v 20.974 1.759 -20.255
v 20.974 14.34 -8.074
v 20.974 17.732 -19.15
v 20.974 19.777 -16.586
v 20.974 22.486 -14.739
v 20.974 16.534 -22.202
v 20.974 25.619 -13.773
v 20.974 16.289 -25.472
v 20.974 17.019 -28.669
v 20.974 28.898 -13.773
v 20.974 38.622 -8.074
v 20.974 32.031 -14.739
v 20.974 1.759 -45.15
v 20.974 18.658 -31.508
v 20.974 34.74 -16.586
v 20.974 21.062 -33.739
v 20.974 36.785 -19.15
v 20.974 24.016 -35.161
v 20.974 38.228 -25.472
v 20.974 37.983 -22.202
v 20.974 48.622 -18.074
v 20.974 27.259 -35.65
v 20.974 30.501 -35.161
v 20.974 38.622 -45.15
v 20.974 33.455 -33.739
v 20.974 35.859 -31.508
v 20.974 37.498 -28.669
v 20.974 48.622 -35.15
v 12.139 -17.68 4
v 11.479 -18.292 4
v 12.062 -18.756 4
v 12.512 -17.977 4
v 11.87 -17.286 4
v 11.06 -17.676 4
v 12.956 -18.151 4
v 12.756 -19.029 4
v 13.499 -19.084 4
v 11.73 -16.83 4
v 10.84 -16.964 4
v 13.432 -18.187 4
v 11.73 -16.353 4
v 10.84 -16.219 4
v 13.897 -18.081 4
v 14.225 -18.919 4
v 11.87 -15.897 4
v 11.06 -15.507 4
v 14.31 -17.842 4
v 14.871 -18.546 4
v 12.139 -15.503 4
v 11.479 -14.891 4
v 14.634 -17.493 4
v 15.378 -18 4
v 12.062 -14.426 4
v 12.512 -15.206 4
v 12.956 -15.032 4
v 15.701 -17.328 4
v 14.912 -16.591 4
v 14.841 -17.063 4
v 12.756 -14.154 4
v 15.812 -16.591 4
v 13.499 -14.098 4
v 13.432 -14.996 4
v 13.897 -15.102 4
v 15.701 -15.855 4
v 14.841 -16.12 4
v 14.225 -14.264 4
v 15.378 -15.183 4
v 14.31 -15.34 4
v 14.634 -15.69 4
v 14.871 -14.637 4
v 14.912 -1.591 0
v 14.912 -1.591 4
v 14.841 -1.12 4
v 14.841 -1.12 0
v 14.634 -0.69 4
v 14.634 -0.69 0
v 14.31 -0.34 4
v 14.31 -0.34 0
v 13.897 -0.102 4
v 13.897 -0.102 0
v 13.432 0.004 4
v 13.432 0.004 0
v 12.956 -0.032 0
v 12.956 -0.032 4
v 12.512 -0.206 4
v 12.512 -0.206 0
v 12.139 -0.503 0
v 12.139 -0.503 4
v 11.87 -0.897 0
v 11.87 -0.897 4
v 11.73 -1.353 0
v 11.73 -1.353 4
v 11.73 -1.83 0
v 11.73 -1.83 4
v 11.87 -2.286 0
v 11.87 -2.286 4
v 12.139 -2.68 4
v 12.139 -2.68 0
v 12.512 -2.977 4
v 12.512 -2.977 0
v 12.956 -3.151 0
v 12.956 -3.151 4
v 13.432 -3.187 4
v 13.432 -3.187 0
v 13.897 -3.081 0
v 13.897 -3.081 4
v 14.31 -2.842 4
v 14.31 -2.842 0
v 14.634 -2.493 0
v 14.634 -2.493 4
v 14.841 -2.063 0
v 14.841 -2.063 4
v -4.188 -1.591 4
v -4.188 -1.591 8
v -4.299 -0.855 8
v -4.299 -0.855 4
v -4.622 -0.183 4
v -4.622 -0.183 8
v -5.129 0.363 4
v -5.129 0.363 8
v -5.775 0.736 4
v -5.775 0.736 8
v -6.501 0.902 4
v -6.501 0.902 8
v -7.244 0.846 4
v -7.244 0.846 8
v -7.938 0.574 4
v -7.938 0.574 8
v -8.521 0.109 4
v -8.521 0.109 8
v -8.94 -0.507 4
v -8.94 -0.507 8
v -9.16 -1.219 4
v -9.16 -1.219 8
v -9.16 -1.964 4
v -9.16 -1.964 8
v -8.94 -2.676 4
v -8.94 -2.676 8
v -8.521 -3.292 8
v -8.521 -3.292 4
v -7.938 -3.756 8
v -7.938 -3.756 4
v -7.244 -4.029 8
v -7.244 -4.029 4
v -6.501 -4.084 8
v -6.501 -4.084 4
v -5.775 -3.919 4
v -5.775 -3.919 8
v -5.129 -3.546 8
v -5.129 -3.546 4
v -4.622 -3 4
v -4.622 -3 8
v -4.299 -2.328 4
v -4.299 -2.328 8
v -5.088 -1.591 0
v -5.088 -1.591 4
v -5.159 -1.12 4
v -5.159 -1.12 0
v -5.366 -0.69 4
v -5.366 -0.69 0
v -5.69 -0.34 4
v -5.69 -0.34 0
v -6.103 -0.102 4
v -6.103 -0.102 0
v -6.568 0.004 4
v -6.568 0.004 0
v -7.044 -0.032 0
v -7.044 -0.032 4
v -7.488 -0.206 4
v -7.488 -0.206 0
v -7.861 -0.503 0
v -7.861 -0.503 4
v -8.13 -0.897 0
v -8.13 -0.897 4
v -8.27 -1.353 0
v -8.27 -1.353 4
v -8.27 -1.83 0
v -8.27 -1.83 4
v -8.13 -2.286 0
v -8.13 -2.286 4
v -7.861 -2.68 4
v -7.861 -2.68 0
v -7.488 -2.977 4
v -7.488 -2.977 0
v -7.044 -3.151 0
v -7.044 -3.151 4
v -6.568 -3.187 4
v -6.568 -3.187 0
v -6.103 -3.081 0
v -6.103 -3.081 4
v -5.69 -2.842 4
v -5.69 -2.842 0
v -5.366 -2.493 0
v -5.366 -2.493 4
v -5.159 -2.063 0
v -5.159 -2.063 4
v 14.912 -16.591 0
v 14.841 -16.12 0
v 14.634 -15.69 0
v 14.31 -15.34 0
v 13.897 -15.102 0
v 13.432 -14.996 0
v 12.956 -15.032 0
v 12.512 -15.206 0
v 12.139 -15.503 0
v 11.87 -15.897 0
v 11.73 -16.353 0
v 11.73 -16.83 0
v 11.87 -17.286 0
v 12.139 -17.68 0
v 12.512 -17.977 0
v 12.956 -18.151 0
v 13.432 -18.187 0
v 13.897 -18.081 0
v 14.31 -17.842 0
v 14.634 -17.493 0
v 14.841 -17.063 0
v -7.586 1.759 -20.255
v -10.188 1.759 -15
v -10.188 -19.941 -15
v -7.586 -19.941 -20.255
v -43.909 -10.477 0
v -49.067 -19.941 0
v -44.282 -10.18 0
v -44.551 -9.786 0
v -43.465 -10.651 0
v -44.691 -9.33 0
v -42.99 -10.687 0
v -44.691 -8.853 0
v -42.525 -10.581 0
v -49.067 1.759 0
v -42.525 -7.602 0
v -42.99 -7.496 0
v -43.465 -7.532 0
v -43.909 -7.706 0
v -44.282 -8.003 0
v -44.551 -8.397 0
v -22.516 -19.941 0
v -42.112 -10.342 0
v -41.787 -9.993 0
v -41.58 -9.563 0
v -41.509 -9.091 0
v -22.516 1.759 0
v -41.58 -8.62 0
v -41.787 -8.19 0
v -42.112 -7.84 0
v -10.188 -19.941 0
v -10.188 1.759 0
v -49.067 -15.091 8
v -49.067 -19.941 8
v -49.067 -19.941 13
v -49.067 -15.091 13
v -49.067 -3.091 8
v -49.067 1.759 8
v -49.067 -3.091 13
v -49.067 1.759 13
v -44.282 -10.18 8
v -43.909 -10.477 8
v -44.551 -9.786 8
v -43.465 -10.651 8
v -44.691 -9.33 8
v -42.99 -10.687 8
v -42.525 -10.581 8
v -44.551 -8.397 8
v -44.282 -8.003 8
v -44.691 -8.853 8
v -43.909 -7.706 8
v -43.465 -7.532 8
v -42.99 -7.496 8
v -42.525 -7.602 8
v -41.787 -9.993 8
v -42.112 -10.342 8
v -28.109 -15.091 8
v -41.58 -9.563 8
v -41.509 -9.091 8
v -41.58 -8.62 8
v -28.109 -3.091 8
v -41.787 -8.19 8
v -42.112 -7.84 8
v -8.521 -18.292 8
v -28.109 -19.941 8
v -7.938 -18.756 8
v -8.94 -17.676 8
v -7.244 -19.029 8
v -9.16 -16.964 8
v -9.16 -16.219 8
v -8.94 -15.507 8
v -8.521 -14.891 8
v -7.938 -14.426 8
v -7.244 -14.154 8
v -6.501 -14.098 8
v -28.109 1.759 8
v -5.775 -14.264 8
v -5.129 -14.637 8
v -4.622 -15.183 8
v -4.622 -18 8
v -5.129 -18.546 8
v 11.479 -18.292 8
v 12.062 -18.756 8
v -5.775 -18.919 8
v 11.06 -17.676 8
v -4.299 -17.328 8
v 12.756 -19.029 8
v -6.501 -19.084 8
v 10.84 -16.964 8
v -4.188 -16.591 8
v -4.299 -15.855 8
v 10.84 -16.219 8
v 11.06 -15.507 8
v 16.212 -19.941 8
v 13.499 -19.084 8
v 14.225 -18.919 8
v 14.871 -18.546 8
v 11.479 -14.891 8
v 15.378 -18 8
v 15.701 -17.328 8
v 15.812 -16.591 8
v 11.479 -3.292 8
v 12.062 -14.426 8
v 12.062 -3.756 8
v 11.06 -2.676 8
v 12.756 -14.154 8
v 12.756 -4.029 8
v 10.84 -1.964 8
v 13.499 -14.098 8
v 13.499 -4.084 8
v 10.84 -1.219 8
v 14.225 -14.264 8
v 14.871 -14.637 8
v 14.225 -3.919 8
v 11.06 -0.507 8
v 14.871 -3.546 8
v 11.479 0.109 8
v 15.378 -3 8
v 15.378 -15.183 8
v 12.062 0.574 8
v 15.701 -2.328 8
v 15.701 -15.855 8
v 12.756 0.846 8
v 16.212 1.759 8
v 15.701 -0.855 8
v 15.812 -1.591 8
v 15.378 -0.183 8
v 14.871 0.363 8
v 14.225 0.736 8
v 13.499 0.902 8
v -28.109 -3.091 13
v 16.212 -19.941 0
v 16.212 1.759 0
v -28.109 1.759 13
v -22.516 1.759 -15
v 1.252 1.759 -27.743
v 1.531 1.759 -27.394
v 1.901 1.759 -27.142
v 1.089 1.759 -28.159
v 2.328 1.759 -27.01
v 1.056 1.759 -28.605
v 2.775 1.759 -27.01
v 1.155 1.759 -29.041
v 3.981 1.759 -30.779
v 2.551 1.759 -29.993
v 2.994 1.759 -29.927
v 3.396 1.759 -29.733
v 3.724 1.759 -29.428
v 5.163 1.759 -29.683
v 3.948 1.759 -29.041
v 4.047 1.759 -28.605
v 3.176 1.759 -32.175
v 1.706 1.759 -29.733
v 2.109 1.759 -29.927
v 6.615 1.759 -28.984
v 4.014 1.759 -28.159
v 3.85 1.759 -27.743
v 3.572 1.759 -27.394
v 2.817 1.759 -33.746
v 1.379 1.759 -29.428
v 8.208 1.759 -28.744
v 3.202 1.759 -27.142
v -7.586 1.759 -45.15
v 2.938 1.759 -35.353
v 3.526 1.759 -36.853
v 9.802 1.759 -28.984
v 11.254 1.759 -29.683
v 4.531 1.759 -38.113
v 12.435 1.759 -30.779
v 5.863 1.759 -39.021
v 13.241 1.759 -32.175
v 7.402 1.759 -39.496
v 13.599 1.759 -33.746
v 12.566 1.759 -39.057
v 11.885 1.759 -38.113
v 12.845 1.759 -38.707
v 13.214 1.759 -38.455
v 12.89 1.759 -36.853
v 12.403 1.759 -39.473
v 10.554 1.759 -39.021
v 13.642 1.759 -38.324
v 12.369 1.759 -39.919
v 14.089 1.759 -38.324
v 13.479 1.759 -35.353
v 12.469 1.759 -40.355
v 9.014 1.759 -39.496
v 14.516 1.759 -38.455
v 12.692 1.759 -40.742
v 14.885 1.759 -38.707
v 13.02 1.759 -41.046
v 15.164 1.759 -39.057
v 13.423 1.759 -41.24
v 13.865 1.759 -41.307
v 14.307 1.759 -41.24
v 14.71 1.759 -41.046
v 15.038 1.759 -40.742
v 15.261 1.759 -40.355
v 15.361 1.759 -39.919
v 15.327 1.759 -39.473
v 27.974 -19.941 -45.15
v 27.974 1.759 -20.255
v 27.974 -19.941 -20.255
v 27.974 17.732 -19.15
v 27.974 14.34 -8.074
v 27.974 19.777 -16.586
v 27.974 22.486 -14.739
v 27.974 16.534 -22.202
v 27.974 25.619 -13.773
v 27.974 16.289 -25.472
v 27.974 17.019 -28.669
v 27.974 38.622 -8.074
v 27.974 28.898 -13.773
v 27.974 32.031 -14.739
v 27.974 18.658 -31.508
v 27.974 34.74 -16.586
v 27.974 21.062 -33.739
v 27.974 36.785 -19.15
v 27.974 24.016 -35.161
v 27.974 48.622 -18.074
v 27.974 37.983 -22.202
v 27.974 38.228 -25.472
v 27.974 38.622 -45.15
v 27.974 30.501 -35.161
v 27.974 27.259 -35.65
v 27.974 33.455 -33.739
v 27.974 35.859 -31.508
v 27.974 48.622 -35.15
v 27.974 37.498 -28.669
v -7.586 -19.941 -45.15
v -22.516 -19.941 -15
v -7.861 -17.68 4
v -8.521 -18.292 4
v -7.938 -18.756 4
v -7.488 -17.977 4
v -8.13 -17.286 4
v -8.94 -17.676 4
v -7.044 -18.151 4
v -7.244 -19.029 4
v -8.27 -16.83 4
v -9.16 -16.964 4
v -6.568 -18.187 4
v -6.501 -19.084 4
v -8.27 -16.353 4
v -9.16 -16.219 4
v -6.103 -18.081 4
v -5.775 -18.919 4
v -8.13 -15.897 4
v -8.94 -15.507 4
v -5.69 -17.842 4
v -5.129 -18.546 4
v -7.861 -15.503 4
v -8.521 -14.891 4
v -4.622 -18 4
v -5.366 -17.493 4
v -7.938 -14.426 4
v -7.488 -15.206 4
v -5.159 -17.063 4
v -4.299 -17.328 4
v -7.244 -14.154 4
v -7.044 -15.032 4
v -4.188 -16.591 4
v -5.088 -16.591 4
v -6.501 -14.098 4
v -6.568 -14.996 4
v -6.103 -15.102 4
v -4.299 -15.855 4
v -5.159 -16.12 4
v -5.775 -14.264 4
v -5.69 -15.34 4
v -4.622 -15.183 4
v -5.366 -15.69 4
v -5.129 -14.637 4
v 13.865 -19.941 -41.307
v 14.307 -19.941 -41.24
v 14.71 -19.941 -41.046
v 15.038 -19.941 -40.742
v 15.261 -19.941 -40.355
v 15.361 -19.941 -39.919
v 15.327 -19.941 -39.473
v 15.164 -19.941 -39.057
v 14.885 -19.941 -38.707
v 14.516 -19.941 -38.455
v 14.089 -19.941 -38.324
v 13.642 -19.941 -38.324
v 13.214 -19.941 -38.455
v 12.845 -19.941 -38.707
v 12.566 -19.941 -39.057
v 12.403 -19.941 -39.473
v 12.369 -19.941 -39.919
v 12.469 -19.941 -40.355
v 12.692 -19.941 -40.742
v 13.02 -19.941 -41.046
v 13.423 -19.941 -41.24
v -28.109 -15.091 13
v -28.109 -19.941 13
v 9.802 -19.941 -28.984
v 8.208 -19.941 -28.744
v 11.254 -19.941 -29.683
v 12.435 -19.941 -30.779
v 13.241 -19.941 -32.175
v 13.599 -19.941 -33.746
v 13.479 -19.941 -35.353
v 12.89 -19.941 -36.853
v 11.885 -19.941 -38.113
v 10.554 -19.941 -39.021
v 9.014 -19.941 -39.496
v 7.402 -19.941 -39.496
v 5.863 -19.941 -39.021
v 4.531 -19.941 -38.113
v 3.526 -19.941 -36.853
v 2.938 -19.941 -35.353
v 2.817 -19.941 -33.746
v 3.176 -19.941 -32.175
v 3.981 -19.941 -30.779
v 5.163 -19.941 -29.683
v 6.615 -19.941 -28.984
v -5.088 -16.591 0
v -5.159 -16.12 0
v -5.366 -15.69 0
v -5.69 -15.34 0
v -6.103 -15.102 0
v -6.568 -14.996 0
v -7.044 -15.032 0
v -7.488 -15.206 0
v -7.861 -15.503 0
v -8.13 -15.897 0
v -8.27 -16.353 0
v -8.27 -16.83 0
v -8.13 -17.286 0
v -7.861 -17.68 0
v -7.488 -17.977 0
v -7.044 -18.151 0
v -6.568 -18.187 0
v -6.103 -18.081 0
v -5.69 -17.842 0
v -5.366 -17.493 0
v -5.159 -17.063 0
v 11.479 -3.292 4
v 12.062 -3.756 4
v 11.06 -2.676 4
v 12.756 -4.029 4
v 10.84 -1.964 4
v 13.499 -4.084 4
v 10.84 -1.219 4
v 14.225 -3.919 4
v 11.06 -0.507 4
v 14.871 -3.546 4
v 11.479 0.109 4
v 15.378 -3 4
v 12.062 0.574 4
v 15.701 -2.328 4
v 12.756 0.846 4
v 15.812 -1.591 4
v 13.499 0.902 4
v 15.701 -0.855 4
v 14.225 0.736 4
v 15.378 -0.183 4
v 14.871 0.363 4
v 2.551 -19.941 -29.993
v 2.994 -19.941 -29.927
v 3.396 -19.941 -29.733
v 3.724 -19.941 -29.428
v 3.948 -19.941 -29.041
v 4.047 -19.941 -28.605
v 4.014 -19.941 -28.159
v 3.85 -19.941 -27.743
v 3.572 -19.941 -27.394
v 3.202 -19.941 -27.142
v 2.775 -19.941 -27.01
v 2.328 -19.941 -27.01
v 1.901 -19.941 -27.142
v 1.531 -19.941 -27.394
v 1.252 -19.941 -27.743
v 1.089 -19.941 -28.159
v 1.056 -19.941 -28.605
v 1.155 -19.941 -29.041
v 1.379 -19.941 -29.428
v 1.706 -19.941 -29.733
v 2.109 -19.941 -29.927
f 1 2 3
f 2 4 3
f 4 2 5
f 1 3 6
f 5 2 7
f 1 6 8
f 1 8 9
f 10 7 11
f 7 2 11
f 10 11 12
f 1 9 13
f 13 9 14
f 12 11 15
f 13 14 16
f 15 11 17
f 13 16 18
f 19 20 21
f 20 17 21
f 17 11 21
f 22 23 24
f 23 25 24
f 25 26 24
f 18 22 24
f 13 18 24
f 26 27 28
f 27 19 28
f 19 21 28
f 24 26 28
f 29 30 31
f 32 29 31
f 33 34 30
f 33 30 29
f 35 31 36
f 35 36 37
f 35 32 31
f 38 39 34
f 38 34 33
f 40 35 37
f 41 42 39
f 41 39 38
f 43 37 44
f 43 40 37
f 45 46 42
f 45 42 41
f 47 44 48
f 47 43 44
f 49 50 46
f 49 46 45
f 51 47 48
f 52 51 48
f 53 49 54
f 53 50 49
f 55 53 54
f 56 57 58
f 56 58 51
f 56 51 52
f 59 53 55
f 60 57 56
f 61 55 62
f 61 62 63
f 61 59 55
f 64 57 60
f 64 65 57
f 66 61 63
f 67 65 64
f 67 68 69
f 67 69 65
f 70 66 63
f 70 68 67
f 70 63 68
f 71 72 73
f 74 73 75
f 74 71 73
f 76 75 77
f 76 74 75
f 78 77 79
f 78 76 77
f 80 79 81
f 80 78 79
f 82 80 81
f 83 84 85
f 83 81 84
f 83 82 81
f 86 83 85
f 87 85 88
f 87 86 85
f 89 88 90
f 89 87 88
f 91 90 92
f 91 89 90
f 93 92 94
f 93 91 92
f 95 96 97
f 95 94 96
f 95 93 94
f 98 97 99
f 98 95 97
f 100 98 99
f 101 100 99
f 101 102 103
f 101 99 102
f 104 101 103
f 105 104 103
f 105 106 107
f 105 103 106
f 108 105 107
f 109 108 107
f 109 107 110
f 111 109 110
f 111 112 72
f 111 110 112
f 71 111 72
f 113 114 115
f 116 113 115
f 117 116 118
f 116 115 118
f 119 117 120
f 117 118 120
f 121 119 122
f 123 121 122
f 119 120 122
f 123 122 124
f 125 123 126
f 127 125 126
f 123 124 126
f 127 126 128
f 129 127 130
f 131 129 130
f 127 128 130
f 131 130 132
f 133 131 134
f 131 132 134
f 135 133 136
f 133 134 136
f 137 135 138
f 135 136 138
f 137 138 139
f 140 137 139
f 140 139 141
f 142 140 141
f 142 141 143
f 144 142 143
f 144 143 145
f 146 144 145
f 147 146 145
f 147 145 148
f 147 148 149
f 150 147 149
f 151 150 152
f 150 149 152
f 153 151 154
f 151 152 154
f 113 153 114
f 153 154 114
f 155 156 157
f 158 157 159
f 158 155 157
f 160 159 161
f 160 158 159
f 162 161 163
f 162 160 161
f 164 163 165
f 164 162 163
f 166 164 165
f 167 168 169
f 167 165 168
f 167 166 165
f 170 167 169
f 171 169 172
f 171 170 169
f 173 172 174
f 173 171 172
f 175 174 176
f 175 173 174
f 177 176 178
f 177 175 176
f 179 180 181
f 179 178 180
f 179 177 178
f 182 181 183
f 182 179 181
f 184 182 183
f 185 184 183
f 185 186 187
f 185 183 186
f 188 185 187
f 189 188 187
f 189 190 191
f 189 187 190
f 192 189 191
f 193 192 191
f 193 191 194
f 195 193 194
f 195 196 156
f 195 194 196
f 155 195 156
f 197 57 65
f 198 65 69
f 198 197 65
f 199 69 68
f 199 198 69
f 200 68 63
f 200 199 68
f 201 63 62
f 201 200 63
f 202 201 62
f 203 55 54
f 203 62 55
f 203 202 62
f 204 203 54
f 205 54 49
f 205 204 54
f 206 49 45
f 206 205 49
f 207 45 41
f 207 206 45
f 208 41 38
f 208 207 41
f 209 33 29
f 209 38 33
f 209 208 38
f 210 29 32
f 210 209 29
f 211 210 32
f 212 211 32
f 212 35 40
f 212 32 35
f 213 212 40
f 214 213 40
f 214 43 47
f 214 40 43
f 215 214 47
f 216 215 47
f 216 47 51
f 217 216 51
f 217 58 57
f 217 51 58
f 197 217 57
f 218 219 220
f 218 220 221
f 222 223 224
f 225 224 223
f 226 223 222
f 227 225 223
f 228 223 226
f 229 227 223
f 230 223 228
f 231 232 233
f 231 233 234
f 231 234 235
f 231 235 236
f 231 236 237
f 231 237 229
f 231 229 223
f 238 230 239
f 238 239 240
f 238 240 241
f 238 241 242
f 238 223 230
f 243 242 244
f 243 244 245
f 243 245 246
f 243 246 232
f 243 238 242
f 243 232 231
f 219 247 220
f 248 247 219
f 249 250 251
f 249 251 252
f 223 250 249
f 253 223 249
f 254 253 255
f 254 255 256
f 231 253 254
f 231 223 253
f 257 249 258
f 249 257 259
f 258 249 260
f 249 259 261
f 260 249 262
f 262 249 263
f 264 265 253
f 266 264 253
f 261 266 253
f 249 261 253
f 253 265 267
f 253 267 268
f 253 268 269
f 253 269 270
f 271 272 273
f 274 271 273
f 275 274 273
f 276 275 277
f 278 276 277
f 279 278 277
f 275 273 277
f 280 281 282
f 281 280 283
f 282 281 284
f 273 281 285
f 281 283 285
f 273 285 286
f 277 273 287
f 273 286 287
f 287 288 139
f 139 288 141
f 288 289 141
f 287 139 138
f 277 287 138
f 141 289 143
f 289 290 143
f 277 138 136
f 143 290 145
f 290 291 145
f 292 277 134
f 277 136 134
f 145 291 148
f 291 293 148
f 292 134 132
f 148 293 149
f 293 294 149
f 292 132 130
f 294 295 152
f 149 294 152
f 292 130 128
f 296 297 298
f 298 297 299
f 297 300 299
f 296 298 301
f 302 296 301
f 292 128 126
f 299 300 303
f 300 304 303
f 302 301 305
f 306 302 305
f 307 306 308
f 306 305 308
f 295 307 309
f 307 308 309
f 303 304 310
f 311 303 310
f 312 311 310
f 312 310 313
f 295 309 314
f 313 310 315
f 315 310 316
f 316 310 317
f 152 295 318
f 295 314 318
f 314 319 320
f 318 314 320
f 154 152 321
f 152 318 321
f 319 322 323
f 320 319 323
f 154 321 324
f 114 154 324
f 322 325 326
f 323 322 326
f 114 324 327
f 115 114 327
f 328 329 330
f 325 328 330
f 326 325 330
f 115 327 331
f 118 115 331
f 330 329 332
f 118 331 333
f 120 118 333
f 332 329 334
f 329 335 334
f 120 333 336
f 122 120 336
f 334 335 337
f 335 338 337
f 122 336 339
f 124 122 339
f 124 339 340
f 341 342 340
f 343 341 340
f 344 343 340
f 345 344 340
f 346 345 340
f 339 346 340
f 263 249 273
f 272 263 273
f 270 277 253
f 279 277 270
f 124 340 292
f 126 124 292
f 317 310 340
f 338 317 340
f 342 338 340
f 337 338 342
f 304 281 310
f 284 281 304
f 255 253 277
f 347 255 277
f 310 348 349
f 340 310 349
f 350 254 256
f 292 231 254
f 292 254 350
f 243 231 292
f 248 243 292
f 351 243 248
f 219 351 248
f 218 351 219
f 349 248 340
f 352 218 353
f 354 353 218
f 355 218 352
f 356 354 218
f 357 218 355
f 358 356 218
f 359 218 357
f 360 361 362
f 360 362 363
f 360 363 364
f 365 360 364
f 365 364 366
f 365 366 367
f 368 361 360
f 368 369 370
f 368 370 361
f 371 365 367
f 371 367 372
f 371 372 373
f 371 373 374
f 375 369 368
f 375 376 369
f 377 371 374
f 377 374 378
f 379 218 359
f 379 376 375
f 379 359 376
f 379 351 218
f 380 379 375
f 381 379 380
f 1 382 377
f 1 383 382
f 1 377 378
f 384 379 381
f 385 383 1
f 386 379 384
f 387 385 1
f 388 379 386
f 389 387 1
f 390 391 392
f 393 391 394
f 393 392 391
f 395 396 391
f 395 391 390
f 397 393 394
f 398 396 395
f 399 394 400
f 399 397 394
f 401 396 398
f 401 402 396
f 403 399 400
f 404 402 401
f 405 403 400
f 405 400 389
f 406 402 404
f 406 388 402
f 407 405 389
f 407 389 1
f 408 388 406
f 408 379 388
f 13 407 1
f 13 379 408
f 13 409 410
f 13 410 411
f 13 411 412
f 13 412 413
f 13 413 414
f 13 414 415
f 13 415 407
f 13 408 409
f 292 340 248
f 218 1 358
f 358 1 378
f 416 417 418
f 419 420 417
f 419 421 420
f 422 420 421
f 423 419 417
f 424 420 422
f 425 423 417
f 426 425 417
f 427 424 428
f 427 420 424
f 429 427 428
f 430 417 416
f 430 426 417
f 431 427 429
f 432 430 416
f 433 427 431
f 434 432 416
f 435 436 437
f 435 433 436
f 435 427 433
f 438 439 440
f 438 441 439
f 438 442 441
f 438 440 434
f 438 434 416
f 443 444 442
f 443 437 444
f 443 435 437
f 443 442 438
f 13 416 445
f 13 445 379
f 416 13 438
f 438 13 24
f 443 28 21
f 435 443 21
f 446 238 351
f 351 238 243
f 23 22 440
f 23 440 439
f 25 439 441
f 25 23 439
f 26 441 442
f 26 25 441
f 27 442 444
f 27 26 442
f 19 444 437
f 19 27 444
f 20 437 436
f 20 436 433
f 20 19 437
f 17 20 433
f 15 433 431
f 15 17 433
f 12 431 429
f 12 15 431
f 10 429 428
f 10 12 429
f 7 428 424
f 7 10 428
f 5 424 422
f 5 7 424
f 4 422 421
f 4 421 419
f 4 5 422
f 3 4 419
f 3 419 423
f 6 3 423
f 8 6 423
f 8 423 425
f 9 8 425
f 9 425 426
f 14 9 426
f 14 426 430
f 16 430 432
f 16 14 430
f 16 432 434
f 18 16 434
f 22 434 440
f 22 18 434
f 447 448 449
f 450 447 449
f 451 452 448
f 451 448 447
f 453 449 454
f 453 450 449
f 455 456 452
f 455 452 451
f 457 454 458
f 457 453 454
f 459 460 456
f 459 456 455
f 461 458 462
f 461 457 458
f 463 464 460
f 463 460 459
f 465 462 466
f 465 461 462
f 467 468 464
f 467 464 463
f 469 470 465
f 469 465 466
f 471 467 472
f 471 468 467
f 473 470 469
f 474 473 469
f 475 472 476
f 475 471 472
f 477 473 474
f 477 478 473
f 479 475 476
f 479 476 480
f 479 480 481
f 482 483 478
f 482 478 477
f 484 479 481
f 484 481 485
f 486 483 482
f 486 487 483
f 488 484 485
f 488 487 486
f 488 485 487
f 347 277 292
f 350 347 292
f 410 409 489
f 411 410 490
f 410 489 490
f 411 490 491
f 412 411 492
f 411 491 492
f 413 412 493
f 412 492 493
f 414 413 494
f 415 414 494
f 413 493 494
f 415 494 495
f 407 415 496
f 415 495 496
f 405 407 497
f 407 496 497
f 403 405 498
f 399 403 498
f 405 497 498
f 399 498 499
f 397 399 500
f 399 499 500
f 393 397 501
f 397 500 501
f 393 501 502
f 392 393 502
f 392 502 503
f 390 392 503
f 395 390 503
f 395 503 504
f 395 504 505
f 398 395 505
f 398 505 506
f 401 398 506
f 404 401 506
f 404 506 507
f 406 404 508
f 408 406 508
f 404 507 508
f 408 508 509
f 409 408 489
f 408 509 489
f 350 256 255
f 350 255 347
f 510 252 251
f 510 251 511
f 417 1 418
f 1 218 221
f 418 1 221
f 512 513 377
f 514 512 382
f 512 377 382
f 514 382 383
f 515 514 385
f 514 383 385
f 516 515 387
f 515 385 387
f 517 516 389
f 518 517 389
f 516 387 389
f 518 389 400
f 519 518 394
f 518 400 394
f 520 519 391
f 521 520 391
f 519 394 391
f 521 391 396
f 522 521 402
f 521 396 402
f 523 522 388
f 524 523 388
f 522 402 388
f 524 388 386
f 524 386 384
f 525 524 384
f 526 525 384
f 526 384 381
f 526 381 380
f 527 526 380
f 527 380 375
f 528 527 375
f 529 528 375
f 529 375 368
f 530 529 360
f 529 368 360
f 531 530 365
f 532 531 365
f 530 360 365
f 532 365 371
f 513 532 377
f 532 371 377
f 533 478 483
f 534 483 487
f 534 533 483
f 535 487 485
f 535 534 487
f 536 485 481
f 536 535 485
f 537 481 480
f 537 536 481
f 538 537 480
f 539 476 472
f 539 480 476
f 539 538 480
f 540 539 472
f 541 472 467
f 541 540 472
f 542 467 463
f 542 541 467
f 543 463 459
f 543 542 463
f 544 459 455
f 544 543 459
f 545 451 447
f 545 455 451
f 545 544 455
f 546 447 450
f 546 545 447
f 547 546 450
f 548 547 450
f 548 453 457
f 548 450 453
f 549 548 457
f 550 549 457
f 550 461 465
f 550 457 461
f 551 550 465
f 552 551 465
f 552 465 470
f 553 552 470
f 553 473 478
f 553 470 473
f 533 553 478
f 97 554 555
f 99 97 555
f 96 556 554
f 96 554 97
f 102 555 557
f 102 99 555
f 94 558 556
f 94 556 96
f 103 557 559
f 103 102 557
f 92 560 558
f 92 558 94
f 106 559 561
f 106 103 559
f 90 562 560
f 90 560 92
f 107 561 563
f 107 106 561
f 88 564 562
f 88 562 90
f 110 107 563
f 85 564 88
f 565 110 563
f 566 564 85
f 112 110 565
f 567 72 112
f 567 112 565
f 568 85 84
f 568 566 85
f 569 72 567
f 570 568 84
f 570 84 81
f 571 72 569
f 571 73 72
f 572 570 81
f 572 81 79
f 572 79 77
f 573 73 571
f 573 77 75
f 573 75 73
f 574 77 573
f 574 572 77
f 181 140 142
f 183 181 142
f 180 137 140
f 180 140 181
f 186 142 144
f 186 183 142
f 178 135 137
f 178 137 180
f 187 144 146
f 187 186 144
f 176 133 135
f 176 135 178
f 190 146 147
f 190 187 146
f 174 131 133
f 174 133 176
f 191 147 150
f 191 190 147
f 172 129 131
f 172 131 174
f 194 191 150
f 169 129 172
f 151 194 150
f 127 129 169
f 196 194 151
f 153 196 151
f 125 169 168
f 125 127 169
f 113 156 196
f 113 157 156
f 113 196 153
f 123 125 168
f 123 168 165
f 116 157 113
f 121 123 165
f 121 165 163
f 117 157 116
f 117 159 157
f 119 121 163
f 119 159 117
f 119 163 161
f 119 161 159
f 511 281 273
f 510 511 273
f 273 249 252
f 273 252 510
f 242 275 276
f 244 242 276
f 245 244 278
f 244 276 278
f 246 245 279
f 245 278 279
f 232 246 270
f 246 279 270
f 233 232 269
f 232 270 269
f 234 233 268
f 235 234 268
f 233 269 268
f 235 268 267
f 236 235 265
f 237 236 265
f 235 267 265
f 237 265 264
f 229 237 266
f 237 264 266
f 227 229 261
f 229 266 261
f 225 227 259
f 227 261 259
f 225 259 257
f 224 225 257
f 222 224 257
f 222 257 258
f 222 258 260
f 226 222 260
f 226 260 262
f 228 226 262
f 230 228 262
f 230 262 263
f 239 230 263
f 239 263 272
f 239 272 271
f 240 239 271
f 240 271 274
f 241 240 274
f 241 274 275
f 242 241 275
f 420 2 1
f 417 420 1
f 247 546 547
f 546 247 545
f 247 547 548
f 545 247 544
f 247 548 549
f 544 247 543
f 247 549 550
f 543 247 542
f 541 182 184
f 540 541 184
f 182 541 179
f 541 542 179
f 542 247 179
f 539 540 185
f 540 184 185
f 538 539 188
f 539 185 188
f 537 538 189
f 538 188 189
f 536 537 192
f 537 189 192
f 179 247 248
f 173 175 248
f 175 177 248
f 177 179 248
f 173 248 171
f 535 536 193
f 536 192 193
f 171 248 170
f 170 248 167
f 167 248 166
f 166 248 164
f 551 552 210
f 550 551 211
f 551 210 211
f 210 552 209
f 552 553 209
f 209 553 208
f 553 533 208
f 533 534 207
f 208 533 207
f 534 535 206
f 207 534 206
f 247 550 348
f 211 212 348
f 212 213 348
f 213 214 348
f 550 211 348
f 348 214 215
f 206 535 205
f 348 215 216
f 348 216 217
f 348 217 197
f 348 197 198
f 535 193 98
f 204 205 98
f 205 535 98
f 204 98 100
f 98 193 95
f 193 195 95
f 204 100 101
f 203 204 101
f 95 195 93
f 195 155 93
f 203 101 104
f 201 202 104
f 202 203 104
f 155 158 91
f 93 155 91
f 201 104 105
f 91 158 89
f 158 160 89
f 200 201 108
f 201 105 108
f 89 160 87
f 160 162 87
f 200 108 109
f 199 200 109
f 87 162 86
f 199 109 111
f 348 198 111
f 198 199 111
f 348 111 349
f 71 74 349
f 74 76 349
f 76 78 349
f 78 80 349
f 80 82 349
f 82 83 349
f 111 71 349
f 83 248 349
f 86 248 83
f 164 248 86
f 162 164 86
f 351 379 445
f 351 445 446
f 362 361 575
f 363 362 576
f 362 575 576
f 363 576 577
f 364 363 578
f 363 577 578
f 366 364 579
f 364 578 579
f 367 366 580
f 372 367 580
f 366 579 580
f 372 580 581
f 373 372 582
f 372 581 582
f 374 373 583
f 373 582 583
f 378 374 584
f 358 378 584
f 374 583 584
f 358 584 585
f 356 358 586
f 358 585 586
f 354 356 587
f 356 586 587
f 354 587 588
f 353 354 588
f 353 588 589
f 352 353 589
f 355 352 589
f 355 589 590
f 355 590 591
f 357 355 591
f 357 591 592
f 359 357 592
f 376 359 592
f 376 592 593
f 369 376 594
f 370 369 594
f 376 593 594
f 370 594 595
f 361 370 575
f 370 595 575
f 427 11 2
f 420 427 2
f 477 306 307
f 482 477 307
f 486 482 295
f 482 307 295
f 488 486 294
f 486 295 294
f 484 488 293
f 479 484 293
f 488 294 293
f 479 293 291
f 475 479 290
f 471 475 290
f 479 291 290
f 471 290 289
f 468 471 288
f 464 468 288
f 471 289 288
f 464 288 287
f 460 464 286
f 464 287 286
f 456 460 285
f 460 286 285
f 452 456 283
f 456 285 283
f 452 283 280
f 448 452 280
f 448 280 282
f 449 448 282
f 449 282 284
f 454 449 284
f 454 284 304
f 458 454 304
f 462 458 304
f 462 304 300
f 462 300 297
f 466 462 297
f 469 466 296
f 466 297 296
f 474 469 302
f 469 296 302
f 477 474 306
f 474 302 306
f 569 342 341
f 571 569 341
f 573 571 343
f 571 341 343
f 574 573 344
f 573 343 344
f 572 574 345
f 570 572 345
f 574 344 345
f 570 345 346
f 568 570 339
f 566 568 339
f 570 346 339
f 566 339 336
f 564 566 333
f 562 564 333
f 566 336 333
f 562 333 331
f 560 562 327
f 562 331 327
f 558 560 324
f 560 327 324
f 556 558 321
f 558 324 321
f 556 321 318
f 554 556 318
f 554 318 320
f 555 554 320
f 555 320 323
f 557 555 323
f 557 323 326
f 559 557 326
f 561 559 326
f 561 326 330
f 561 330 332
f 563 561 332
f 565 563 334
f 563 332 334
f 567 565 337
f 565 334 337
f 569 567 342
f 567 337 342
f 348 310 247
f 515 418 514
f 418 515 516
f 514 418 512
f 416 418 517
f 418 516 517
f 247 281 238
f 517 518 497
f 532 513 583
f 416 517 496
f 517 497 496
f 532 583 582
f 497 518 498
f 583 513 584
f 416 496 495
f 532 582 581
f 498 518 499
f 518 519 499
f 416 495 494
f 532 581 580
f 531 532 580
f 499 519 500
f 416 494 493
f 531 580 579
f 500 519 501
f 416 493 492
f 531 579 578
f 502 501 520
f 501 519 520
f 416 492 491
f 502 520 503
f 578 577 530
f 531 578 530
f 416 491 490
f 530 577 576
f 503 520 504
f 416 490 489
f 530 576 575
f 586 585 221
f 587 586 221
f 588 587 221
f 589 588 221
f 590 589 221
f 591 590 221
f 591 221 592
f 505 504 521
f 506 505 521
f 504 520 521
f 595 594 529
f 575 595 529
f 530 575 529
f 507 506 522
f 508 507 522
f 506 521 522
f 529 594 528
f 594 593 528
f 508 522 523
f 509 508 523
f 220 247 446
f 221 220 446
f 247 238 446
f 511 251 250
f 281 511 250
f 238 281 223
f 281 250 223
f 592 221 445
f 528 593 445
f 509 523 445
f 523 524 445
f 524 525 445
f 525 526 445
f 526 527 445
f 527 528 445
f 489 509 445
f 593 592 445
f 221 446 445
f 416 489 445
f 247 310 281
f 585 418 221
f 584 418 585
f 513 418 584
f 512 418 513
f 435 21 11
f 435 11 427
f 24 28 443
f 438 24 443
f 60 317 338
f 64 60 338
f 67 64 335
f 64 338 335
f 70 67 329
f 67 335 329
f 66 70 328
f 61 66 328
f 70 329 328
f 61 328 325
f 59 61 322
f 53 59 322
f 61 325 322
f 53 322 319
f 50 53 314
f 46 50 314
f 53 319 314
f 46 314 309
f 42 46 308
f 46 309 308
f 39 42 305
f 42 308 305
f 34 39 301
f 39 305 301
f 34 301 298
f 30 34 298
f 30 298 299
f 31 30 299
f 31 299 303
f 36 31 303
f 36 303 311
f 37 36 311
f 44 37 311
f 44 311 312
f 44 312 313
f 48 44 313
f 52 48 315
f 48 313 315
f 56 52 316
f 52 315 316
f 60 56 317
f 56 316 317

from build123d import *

# Parameters (mm, degrees)
SKICA1_W                 = 50.278910674
SKICA1_H                 = 21.7
SKICA1_R                 = 1.6
P_IDAT_VYSUNUT_M1_DEPTH  = 8
SKICA2_R                 = 2.5
ODEBRAT_VYSUNUT_M1_DEPTH = 4
SKICA4_W                 = 12.327690559
SKICA4_H                 = 21.7
P_IDAT_VYSUNUT_M2_DEPTH  = 15
SKICA6_R                 = 5.406276896
P_IDAT_VYSUNUT_M3_DEPTH  = 21.7
SKICA7_R                 = 1.5
ODEBRAT_VYSUNUT_M3_DEPTH = 21.7
SKICA8_W                 = 8
SKICA8_H                 = 21.7
P_IDAT_VYSUNUT_M4_DEPTH  = 15
SKICA9_R                 = 1.6
ODEBRAT_VYSUNUT_M4_DEPTH = 15
SKICA10_R                = 11
P_IDAT_VYSUNUT_M5_DEPTH  = 7
ZKOSEN_1_SIZE            = 10
SKICA11_W                = 20.957821349
SKICA11_H                = 4.85
P_IDAT_VYSUNUT_M6_DEPTH  = 5


with BuildPart() as part:
    # Skica1 → Přidat vysunutím1 (new body)
    with BuildSketch(Plane.XY):
        with Locations((-8.927473885, -9.09140889)):
            Rectangle(SKICA1_W, SKICA1_H)
        with Locations((13.311981452, -16.59140889)):
            Circle(SKICA1_R, mode=Mode.SUBTRACT)
        with Locations((-6.688018548, -16.59140889)):
            Circle(SKICA1_R, mode=Mode.SUBTRACT)
        with Locations((-6.688018548, -1.59140889)):
            Circle(SKICA1_R, mode=Mode.SUBTRACT)
        with Locations((13.311981452, -1.59140889)):
            Circle(SKICA1_R, mode=Mode.SUBTRACT)
    extrude(amount=P_IDAT_VYSUNUT_M1_DEPTH)

    # Skica2 → Odebrat vysunutím1 (cut)
    with BuildSketch(Plane.XY.offset(8)):
        with Locations((13.311981452, -16.59140889)):
            Circle(SKICA2_R)
        with Locations((-6.688018548, -16.59140889)):
            Circle(SKICA2_R)
        with Locations((-6.688018548, -1.59140889)):
            Circle(SKICA2_R)
        with Locations((13.311981452, -1.59140889)):
            Circle(SKICA2_R)
    extrude(amount=-ODEBRAT_VYSUNUT_M1_DEPTH, mode=Mode.SUBTRACT)

    # Skica4 → Přidat vysunutím2 (add)
    with BuildSketch(Plane(origin=(0, 0, 0), x_dir=(-1, 0, 0), z_dir=(0, 0, -1))):
        with Locations((16.351863828, -9.09140889)):
            Rectangle(SKICA4_W, SKICA4_H)
    extrude(amount=P_IDAT_VYSUNUT_M2_DEPTH)

    # Skica6 → Přidat vysunutím3 (add)
    with BuildSketch(Plane(origin=(0, 1.75859111, 0), x_dir=(1, 0, 0), z_dir=(0, 1, 0))):
        Polygon((-22.515709107, 15), (-10.188018548, 15), (-7.585826442, 20.254970434), (20.97371307, 20.254970434), (20.97371307, 45.15), (4.741864117, 45.15), (-7.585826442, 45.15), align=None)
        with Locations(Location((8.208247023, 34.15, 0), (0, 0, 270))):
            Circle(SKICA6_R, mode=Mode.SUBTRACT)
    extrude(amount=-P_IDAT_VYSUNUT_M3_DEPTH)

    # Skica7 → Odebrat vysunutím3 (cut)
    with BuildSketch(Plane.XZ.offset(19.94140889)):
        with Locations(Location((2.551392773, -28.493145751, 0), (0, 0, 270))):
            Circle(SKICA7_R)
        with Locations(Location((13.865101272, -39.806854249, 0), (0, 0, 270))):
            Circle(SKICA7_R)
    extrude(amount=-ODEBRAT_VYSUNUT_M3_DEPTH, mode=Mode.SUBTRACT)

    # Skica8 → Přidat vysunutím4 (add)
    with BuildSketch(Plane.ZY.offset(34.066929222)):
        with Locations((4, -9.09140889)):
            Rectangle(SKICA8_W, SKICA8_H)
    extrude(amount=P_IDAT_VYSUNUT_M4_DEPTH)

    # Skica9 → Odebrat vysunutím4 (cut)
    with BuildSketch(Plane.XY.offset(8)):
        with Locations((-43.109107873, -9.09140889)):
            Circle(SKICA9_R)
    extrude(amount=-ODEBRAT_VYSUNUT_M4_DEPTH, mode=Mode.SUBTRACT)

    # Skica10 → Přidat vysunutím5 (add)
    with BuildSketch(Plane(origin=(20.97371307, 0, 0), x_dir=(0, 0, -1), z_dir=(1, 0, 0))):
        Polygon((8.074184901, 14.340387575), (20.254970434, 1.75859111), (20.254970434, -19.94140889), (45.15, -19.94140889), (45.15, 48.622184041), (8.074184901, 48.622184041), align=None)
        with Locations((24.65, 27.25859111)):
            Circle(SKICA10_R, mode=Mode.SUBTRACT)
    extrude(amount=P_IDAT_VYSUNUT_M5_DEPTH)

    # Zkosení1
    zkosen_1_edges = [part.edges().sort_by_distance(p)[0] for p in [
        (24.47371307, 48.622184041, -45.15),
        (24.47371307, 48.622184041, -8.074184901),
    ]]
    chamfer(zkosen_1_edges, length=ZKOSEN_1_SIZE)

    # Skica11 → Přidat vysunutím6 (add)
    with BuildSketch(Plane.XY.offset(8)):
        with Locations((-38.588018548, -0.66640889)):
            Rectangle(SKICA11_W, SKICA11_H)
        with Locations((-38.588018548, -17.51640889)):
            Rectangle(SKICA11_W, SKICA11_H)
    extrude(amount=P_IDAT_VYSUNUT_M6_DEPTH)


solid = part.part
